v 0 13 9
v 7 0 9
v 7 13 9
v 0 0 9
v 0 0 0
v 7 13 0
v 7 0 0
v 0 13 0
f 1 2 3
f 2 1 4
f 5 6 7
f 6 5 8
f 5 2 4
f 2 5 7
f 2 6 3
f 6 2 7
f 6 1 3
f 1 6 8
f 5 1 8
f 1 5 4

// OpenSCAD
// Generated by SolidPython 1.0.1 on 2020-07-29 00:46:55


cube(size = [7, 13, 9]);
/***********************************************
*********      SolidPython code:      **********
************************************************
 
# import packages: SolidPython
from solid import *
from solid.utils import *
from itertools import chain, combinations, permutations


class Resize:

    def __init__(self, scad_file):
        self.scad_file = scad_file
        #self.scad_file = import_scad(scad_file)
        # cone/cylinder param:
        self.r1 = 0
        self.r2 = 0
        self.h = 0
        # rectangular prism param:
        self.w = 0
        self.l = 0
        # ellipse param:
        self.r = 0

    # import OpenScad code (file name corresponds to shape)


    # classify shape + parameters
    def assign(self, param1, param2, param3):
        if self.scad_file == 'cone.scad':
            self.r1 = param1
            self.r2 = param2
            self.h = param3
        elif self.scad_file == 'cylinder.scad':
            self.r1 = param1
            self.r2 = param2
            self.h = param3
        elif self.scad_file == 'rectangularPrism.scad':
            self.h = param1
            self.l = param2
            self.w = param3
        else:
            self.r = param1
            self.h = param2

    # resize parameters
    def iterate(self):
        x = range(3, 20, 2)
        i = 1
        if self.scad_file == 'cone.scad':
            tempList = list(permutations(x, 2))
            for temp in tempList:
                param1 = temp[0]
                param2 = temp[1]
                filepath = 'produced_scad_files/' + 'cone' + str(param1) + '_' + str(param2) + '_' + '.scad'
                scad_render_to_file(cylinder(h=param1, r1=param2, r2=0), filepath)

        elif self.scad_file == 'cylinder.scad':
            tempList = list(permutations(x, 3))
            for temp in tempList:
                param1 = temp[0]
                param2 = temp[1]
                filepath = 'produced_scad_files/' + 'cylinder' + str(param1) + '_' + str(param2) + '_' + '.scad'
                scad_render_to_file(cylinder(h=param1, r1=param2, r2=param2), filepath)

        elif self.scad_file == 'rectangularPrism.scad':
            tempList = list(permutations(x, 3))
            for temp in tempList:
                param1 = temp[0]
                param2 = temp[1]
                param3 = temp[2]
                filepath = 'produced_scad_files/' + 'rectangularPrism' + str(param1) + '_' + str(param2) + '_' + str(
                    param3) + '.scad'
                scad_render_to_file(cube(size=(param1, param2, param3)), filepath)

        elif self.scad_file == 'ellipse.scad':
            tempList = list(permutations(x, 4))
            for temp in tempList:
                param1 = temp[0]
                param2 = temp[1]
                param3 = temp[2]
                param4 = temp[3]
                filepath = 'produced_scad_files/' + 'ellipse' + str(param1) + '_' + str(param2) + '_' + str(param3) + '_' + str(param4) + '.scad'
                scad_render_to_file(scale([param1, param2, param3])(sphere(r=param4)), filepath)

    def render_to_scadfile(self):
        scad_render_to_file(scad, 'example.scad') 
 
************************************************/
